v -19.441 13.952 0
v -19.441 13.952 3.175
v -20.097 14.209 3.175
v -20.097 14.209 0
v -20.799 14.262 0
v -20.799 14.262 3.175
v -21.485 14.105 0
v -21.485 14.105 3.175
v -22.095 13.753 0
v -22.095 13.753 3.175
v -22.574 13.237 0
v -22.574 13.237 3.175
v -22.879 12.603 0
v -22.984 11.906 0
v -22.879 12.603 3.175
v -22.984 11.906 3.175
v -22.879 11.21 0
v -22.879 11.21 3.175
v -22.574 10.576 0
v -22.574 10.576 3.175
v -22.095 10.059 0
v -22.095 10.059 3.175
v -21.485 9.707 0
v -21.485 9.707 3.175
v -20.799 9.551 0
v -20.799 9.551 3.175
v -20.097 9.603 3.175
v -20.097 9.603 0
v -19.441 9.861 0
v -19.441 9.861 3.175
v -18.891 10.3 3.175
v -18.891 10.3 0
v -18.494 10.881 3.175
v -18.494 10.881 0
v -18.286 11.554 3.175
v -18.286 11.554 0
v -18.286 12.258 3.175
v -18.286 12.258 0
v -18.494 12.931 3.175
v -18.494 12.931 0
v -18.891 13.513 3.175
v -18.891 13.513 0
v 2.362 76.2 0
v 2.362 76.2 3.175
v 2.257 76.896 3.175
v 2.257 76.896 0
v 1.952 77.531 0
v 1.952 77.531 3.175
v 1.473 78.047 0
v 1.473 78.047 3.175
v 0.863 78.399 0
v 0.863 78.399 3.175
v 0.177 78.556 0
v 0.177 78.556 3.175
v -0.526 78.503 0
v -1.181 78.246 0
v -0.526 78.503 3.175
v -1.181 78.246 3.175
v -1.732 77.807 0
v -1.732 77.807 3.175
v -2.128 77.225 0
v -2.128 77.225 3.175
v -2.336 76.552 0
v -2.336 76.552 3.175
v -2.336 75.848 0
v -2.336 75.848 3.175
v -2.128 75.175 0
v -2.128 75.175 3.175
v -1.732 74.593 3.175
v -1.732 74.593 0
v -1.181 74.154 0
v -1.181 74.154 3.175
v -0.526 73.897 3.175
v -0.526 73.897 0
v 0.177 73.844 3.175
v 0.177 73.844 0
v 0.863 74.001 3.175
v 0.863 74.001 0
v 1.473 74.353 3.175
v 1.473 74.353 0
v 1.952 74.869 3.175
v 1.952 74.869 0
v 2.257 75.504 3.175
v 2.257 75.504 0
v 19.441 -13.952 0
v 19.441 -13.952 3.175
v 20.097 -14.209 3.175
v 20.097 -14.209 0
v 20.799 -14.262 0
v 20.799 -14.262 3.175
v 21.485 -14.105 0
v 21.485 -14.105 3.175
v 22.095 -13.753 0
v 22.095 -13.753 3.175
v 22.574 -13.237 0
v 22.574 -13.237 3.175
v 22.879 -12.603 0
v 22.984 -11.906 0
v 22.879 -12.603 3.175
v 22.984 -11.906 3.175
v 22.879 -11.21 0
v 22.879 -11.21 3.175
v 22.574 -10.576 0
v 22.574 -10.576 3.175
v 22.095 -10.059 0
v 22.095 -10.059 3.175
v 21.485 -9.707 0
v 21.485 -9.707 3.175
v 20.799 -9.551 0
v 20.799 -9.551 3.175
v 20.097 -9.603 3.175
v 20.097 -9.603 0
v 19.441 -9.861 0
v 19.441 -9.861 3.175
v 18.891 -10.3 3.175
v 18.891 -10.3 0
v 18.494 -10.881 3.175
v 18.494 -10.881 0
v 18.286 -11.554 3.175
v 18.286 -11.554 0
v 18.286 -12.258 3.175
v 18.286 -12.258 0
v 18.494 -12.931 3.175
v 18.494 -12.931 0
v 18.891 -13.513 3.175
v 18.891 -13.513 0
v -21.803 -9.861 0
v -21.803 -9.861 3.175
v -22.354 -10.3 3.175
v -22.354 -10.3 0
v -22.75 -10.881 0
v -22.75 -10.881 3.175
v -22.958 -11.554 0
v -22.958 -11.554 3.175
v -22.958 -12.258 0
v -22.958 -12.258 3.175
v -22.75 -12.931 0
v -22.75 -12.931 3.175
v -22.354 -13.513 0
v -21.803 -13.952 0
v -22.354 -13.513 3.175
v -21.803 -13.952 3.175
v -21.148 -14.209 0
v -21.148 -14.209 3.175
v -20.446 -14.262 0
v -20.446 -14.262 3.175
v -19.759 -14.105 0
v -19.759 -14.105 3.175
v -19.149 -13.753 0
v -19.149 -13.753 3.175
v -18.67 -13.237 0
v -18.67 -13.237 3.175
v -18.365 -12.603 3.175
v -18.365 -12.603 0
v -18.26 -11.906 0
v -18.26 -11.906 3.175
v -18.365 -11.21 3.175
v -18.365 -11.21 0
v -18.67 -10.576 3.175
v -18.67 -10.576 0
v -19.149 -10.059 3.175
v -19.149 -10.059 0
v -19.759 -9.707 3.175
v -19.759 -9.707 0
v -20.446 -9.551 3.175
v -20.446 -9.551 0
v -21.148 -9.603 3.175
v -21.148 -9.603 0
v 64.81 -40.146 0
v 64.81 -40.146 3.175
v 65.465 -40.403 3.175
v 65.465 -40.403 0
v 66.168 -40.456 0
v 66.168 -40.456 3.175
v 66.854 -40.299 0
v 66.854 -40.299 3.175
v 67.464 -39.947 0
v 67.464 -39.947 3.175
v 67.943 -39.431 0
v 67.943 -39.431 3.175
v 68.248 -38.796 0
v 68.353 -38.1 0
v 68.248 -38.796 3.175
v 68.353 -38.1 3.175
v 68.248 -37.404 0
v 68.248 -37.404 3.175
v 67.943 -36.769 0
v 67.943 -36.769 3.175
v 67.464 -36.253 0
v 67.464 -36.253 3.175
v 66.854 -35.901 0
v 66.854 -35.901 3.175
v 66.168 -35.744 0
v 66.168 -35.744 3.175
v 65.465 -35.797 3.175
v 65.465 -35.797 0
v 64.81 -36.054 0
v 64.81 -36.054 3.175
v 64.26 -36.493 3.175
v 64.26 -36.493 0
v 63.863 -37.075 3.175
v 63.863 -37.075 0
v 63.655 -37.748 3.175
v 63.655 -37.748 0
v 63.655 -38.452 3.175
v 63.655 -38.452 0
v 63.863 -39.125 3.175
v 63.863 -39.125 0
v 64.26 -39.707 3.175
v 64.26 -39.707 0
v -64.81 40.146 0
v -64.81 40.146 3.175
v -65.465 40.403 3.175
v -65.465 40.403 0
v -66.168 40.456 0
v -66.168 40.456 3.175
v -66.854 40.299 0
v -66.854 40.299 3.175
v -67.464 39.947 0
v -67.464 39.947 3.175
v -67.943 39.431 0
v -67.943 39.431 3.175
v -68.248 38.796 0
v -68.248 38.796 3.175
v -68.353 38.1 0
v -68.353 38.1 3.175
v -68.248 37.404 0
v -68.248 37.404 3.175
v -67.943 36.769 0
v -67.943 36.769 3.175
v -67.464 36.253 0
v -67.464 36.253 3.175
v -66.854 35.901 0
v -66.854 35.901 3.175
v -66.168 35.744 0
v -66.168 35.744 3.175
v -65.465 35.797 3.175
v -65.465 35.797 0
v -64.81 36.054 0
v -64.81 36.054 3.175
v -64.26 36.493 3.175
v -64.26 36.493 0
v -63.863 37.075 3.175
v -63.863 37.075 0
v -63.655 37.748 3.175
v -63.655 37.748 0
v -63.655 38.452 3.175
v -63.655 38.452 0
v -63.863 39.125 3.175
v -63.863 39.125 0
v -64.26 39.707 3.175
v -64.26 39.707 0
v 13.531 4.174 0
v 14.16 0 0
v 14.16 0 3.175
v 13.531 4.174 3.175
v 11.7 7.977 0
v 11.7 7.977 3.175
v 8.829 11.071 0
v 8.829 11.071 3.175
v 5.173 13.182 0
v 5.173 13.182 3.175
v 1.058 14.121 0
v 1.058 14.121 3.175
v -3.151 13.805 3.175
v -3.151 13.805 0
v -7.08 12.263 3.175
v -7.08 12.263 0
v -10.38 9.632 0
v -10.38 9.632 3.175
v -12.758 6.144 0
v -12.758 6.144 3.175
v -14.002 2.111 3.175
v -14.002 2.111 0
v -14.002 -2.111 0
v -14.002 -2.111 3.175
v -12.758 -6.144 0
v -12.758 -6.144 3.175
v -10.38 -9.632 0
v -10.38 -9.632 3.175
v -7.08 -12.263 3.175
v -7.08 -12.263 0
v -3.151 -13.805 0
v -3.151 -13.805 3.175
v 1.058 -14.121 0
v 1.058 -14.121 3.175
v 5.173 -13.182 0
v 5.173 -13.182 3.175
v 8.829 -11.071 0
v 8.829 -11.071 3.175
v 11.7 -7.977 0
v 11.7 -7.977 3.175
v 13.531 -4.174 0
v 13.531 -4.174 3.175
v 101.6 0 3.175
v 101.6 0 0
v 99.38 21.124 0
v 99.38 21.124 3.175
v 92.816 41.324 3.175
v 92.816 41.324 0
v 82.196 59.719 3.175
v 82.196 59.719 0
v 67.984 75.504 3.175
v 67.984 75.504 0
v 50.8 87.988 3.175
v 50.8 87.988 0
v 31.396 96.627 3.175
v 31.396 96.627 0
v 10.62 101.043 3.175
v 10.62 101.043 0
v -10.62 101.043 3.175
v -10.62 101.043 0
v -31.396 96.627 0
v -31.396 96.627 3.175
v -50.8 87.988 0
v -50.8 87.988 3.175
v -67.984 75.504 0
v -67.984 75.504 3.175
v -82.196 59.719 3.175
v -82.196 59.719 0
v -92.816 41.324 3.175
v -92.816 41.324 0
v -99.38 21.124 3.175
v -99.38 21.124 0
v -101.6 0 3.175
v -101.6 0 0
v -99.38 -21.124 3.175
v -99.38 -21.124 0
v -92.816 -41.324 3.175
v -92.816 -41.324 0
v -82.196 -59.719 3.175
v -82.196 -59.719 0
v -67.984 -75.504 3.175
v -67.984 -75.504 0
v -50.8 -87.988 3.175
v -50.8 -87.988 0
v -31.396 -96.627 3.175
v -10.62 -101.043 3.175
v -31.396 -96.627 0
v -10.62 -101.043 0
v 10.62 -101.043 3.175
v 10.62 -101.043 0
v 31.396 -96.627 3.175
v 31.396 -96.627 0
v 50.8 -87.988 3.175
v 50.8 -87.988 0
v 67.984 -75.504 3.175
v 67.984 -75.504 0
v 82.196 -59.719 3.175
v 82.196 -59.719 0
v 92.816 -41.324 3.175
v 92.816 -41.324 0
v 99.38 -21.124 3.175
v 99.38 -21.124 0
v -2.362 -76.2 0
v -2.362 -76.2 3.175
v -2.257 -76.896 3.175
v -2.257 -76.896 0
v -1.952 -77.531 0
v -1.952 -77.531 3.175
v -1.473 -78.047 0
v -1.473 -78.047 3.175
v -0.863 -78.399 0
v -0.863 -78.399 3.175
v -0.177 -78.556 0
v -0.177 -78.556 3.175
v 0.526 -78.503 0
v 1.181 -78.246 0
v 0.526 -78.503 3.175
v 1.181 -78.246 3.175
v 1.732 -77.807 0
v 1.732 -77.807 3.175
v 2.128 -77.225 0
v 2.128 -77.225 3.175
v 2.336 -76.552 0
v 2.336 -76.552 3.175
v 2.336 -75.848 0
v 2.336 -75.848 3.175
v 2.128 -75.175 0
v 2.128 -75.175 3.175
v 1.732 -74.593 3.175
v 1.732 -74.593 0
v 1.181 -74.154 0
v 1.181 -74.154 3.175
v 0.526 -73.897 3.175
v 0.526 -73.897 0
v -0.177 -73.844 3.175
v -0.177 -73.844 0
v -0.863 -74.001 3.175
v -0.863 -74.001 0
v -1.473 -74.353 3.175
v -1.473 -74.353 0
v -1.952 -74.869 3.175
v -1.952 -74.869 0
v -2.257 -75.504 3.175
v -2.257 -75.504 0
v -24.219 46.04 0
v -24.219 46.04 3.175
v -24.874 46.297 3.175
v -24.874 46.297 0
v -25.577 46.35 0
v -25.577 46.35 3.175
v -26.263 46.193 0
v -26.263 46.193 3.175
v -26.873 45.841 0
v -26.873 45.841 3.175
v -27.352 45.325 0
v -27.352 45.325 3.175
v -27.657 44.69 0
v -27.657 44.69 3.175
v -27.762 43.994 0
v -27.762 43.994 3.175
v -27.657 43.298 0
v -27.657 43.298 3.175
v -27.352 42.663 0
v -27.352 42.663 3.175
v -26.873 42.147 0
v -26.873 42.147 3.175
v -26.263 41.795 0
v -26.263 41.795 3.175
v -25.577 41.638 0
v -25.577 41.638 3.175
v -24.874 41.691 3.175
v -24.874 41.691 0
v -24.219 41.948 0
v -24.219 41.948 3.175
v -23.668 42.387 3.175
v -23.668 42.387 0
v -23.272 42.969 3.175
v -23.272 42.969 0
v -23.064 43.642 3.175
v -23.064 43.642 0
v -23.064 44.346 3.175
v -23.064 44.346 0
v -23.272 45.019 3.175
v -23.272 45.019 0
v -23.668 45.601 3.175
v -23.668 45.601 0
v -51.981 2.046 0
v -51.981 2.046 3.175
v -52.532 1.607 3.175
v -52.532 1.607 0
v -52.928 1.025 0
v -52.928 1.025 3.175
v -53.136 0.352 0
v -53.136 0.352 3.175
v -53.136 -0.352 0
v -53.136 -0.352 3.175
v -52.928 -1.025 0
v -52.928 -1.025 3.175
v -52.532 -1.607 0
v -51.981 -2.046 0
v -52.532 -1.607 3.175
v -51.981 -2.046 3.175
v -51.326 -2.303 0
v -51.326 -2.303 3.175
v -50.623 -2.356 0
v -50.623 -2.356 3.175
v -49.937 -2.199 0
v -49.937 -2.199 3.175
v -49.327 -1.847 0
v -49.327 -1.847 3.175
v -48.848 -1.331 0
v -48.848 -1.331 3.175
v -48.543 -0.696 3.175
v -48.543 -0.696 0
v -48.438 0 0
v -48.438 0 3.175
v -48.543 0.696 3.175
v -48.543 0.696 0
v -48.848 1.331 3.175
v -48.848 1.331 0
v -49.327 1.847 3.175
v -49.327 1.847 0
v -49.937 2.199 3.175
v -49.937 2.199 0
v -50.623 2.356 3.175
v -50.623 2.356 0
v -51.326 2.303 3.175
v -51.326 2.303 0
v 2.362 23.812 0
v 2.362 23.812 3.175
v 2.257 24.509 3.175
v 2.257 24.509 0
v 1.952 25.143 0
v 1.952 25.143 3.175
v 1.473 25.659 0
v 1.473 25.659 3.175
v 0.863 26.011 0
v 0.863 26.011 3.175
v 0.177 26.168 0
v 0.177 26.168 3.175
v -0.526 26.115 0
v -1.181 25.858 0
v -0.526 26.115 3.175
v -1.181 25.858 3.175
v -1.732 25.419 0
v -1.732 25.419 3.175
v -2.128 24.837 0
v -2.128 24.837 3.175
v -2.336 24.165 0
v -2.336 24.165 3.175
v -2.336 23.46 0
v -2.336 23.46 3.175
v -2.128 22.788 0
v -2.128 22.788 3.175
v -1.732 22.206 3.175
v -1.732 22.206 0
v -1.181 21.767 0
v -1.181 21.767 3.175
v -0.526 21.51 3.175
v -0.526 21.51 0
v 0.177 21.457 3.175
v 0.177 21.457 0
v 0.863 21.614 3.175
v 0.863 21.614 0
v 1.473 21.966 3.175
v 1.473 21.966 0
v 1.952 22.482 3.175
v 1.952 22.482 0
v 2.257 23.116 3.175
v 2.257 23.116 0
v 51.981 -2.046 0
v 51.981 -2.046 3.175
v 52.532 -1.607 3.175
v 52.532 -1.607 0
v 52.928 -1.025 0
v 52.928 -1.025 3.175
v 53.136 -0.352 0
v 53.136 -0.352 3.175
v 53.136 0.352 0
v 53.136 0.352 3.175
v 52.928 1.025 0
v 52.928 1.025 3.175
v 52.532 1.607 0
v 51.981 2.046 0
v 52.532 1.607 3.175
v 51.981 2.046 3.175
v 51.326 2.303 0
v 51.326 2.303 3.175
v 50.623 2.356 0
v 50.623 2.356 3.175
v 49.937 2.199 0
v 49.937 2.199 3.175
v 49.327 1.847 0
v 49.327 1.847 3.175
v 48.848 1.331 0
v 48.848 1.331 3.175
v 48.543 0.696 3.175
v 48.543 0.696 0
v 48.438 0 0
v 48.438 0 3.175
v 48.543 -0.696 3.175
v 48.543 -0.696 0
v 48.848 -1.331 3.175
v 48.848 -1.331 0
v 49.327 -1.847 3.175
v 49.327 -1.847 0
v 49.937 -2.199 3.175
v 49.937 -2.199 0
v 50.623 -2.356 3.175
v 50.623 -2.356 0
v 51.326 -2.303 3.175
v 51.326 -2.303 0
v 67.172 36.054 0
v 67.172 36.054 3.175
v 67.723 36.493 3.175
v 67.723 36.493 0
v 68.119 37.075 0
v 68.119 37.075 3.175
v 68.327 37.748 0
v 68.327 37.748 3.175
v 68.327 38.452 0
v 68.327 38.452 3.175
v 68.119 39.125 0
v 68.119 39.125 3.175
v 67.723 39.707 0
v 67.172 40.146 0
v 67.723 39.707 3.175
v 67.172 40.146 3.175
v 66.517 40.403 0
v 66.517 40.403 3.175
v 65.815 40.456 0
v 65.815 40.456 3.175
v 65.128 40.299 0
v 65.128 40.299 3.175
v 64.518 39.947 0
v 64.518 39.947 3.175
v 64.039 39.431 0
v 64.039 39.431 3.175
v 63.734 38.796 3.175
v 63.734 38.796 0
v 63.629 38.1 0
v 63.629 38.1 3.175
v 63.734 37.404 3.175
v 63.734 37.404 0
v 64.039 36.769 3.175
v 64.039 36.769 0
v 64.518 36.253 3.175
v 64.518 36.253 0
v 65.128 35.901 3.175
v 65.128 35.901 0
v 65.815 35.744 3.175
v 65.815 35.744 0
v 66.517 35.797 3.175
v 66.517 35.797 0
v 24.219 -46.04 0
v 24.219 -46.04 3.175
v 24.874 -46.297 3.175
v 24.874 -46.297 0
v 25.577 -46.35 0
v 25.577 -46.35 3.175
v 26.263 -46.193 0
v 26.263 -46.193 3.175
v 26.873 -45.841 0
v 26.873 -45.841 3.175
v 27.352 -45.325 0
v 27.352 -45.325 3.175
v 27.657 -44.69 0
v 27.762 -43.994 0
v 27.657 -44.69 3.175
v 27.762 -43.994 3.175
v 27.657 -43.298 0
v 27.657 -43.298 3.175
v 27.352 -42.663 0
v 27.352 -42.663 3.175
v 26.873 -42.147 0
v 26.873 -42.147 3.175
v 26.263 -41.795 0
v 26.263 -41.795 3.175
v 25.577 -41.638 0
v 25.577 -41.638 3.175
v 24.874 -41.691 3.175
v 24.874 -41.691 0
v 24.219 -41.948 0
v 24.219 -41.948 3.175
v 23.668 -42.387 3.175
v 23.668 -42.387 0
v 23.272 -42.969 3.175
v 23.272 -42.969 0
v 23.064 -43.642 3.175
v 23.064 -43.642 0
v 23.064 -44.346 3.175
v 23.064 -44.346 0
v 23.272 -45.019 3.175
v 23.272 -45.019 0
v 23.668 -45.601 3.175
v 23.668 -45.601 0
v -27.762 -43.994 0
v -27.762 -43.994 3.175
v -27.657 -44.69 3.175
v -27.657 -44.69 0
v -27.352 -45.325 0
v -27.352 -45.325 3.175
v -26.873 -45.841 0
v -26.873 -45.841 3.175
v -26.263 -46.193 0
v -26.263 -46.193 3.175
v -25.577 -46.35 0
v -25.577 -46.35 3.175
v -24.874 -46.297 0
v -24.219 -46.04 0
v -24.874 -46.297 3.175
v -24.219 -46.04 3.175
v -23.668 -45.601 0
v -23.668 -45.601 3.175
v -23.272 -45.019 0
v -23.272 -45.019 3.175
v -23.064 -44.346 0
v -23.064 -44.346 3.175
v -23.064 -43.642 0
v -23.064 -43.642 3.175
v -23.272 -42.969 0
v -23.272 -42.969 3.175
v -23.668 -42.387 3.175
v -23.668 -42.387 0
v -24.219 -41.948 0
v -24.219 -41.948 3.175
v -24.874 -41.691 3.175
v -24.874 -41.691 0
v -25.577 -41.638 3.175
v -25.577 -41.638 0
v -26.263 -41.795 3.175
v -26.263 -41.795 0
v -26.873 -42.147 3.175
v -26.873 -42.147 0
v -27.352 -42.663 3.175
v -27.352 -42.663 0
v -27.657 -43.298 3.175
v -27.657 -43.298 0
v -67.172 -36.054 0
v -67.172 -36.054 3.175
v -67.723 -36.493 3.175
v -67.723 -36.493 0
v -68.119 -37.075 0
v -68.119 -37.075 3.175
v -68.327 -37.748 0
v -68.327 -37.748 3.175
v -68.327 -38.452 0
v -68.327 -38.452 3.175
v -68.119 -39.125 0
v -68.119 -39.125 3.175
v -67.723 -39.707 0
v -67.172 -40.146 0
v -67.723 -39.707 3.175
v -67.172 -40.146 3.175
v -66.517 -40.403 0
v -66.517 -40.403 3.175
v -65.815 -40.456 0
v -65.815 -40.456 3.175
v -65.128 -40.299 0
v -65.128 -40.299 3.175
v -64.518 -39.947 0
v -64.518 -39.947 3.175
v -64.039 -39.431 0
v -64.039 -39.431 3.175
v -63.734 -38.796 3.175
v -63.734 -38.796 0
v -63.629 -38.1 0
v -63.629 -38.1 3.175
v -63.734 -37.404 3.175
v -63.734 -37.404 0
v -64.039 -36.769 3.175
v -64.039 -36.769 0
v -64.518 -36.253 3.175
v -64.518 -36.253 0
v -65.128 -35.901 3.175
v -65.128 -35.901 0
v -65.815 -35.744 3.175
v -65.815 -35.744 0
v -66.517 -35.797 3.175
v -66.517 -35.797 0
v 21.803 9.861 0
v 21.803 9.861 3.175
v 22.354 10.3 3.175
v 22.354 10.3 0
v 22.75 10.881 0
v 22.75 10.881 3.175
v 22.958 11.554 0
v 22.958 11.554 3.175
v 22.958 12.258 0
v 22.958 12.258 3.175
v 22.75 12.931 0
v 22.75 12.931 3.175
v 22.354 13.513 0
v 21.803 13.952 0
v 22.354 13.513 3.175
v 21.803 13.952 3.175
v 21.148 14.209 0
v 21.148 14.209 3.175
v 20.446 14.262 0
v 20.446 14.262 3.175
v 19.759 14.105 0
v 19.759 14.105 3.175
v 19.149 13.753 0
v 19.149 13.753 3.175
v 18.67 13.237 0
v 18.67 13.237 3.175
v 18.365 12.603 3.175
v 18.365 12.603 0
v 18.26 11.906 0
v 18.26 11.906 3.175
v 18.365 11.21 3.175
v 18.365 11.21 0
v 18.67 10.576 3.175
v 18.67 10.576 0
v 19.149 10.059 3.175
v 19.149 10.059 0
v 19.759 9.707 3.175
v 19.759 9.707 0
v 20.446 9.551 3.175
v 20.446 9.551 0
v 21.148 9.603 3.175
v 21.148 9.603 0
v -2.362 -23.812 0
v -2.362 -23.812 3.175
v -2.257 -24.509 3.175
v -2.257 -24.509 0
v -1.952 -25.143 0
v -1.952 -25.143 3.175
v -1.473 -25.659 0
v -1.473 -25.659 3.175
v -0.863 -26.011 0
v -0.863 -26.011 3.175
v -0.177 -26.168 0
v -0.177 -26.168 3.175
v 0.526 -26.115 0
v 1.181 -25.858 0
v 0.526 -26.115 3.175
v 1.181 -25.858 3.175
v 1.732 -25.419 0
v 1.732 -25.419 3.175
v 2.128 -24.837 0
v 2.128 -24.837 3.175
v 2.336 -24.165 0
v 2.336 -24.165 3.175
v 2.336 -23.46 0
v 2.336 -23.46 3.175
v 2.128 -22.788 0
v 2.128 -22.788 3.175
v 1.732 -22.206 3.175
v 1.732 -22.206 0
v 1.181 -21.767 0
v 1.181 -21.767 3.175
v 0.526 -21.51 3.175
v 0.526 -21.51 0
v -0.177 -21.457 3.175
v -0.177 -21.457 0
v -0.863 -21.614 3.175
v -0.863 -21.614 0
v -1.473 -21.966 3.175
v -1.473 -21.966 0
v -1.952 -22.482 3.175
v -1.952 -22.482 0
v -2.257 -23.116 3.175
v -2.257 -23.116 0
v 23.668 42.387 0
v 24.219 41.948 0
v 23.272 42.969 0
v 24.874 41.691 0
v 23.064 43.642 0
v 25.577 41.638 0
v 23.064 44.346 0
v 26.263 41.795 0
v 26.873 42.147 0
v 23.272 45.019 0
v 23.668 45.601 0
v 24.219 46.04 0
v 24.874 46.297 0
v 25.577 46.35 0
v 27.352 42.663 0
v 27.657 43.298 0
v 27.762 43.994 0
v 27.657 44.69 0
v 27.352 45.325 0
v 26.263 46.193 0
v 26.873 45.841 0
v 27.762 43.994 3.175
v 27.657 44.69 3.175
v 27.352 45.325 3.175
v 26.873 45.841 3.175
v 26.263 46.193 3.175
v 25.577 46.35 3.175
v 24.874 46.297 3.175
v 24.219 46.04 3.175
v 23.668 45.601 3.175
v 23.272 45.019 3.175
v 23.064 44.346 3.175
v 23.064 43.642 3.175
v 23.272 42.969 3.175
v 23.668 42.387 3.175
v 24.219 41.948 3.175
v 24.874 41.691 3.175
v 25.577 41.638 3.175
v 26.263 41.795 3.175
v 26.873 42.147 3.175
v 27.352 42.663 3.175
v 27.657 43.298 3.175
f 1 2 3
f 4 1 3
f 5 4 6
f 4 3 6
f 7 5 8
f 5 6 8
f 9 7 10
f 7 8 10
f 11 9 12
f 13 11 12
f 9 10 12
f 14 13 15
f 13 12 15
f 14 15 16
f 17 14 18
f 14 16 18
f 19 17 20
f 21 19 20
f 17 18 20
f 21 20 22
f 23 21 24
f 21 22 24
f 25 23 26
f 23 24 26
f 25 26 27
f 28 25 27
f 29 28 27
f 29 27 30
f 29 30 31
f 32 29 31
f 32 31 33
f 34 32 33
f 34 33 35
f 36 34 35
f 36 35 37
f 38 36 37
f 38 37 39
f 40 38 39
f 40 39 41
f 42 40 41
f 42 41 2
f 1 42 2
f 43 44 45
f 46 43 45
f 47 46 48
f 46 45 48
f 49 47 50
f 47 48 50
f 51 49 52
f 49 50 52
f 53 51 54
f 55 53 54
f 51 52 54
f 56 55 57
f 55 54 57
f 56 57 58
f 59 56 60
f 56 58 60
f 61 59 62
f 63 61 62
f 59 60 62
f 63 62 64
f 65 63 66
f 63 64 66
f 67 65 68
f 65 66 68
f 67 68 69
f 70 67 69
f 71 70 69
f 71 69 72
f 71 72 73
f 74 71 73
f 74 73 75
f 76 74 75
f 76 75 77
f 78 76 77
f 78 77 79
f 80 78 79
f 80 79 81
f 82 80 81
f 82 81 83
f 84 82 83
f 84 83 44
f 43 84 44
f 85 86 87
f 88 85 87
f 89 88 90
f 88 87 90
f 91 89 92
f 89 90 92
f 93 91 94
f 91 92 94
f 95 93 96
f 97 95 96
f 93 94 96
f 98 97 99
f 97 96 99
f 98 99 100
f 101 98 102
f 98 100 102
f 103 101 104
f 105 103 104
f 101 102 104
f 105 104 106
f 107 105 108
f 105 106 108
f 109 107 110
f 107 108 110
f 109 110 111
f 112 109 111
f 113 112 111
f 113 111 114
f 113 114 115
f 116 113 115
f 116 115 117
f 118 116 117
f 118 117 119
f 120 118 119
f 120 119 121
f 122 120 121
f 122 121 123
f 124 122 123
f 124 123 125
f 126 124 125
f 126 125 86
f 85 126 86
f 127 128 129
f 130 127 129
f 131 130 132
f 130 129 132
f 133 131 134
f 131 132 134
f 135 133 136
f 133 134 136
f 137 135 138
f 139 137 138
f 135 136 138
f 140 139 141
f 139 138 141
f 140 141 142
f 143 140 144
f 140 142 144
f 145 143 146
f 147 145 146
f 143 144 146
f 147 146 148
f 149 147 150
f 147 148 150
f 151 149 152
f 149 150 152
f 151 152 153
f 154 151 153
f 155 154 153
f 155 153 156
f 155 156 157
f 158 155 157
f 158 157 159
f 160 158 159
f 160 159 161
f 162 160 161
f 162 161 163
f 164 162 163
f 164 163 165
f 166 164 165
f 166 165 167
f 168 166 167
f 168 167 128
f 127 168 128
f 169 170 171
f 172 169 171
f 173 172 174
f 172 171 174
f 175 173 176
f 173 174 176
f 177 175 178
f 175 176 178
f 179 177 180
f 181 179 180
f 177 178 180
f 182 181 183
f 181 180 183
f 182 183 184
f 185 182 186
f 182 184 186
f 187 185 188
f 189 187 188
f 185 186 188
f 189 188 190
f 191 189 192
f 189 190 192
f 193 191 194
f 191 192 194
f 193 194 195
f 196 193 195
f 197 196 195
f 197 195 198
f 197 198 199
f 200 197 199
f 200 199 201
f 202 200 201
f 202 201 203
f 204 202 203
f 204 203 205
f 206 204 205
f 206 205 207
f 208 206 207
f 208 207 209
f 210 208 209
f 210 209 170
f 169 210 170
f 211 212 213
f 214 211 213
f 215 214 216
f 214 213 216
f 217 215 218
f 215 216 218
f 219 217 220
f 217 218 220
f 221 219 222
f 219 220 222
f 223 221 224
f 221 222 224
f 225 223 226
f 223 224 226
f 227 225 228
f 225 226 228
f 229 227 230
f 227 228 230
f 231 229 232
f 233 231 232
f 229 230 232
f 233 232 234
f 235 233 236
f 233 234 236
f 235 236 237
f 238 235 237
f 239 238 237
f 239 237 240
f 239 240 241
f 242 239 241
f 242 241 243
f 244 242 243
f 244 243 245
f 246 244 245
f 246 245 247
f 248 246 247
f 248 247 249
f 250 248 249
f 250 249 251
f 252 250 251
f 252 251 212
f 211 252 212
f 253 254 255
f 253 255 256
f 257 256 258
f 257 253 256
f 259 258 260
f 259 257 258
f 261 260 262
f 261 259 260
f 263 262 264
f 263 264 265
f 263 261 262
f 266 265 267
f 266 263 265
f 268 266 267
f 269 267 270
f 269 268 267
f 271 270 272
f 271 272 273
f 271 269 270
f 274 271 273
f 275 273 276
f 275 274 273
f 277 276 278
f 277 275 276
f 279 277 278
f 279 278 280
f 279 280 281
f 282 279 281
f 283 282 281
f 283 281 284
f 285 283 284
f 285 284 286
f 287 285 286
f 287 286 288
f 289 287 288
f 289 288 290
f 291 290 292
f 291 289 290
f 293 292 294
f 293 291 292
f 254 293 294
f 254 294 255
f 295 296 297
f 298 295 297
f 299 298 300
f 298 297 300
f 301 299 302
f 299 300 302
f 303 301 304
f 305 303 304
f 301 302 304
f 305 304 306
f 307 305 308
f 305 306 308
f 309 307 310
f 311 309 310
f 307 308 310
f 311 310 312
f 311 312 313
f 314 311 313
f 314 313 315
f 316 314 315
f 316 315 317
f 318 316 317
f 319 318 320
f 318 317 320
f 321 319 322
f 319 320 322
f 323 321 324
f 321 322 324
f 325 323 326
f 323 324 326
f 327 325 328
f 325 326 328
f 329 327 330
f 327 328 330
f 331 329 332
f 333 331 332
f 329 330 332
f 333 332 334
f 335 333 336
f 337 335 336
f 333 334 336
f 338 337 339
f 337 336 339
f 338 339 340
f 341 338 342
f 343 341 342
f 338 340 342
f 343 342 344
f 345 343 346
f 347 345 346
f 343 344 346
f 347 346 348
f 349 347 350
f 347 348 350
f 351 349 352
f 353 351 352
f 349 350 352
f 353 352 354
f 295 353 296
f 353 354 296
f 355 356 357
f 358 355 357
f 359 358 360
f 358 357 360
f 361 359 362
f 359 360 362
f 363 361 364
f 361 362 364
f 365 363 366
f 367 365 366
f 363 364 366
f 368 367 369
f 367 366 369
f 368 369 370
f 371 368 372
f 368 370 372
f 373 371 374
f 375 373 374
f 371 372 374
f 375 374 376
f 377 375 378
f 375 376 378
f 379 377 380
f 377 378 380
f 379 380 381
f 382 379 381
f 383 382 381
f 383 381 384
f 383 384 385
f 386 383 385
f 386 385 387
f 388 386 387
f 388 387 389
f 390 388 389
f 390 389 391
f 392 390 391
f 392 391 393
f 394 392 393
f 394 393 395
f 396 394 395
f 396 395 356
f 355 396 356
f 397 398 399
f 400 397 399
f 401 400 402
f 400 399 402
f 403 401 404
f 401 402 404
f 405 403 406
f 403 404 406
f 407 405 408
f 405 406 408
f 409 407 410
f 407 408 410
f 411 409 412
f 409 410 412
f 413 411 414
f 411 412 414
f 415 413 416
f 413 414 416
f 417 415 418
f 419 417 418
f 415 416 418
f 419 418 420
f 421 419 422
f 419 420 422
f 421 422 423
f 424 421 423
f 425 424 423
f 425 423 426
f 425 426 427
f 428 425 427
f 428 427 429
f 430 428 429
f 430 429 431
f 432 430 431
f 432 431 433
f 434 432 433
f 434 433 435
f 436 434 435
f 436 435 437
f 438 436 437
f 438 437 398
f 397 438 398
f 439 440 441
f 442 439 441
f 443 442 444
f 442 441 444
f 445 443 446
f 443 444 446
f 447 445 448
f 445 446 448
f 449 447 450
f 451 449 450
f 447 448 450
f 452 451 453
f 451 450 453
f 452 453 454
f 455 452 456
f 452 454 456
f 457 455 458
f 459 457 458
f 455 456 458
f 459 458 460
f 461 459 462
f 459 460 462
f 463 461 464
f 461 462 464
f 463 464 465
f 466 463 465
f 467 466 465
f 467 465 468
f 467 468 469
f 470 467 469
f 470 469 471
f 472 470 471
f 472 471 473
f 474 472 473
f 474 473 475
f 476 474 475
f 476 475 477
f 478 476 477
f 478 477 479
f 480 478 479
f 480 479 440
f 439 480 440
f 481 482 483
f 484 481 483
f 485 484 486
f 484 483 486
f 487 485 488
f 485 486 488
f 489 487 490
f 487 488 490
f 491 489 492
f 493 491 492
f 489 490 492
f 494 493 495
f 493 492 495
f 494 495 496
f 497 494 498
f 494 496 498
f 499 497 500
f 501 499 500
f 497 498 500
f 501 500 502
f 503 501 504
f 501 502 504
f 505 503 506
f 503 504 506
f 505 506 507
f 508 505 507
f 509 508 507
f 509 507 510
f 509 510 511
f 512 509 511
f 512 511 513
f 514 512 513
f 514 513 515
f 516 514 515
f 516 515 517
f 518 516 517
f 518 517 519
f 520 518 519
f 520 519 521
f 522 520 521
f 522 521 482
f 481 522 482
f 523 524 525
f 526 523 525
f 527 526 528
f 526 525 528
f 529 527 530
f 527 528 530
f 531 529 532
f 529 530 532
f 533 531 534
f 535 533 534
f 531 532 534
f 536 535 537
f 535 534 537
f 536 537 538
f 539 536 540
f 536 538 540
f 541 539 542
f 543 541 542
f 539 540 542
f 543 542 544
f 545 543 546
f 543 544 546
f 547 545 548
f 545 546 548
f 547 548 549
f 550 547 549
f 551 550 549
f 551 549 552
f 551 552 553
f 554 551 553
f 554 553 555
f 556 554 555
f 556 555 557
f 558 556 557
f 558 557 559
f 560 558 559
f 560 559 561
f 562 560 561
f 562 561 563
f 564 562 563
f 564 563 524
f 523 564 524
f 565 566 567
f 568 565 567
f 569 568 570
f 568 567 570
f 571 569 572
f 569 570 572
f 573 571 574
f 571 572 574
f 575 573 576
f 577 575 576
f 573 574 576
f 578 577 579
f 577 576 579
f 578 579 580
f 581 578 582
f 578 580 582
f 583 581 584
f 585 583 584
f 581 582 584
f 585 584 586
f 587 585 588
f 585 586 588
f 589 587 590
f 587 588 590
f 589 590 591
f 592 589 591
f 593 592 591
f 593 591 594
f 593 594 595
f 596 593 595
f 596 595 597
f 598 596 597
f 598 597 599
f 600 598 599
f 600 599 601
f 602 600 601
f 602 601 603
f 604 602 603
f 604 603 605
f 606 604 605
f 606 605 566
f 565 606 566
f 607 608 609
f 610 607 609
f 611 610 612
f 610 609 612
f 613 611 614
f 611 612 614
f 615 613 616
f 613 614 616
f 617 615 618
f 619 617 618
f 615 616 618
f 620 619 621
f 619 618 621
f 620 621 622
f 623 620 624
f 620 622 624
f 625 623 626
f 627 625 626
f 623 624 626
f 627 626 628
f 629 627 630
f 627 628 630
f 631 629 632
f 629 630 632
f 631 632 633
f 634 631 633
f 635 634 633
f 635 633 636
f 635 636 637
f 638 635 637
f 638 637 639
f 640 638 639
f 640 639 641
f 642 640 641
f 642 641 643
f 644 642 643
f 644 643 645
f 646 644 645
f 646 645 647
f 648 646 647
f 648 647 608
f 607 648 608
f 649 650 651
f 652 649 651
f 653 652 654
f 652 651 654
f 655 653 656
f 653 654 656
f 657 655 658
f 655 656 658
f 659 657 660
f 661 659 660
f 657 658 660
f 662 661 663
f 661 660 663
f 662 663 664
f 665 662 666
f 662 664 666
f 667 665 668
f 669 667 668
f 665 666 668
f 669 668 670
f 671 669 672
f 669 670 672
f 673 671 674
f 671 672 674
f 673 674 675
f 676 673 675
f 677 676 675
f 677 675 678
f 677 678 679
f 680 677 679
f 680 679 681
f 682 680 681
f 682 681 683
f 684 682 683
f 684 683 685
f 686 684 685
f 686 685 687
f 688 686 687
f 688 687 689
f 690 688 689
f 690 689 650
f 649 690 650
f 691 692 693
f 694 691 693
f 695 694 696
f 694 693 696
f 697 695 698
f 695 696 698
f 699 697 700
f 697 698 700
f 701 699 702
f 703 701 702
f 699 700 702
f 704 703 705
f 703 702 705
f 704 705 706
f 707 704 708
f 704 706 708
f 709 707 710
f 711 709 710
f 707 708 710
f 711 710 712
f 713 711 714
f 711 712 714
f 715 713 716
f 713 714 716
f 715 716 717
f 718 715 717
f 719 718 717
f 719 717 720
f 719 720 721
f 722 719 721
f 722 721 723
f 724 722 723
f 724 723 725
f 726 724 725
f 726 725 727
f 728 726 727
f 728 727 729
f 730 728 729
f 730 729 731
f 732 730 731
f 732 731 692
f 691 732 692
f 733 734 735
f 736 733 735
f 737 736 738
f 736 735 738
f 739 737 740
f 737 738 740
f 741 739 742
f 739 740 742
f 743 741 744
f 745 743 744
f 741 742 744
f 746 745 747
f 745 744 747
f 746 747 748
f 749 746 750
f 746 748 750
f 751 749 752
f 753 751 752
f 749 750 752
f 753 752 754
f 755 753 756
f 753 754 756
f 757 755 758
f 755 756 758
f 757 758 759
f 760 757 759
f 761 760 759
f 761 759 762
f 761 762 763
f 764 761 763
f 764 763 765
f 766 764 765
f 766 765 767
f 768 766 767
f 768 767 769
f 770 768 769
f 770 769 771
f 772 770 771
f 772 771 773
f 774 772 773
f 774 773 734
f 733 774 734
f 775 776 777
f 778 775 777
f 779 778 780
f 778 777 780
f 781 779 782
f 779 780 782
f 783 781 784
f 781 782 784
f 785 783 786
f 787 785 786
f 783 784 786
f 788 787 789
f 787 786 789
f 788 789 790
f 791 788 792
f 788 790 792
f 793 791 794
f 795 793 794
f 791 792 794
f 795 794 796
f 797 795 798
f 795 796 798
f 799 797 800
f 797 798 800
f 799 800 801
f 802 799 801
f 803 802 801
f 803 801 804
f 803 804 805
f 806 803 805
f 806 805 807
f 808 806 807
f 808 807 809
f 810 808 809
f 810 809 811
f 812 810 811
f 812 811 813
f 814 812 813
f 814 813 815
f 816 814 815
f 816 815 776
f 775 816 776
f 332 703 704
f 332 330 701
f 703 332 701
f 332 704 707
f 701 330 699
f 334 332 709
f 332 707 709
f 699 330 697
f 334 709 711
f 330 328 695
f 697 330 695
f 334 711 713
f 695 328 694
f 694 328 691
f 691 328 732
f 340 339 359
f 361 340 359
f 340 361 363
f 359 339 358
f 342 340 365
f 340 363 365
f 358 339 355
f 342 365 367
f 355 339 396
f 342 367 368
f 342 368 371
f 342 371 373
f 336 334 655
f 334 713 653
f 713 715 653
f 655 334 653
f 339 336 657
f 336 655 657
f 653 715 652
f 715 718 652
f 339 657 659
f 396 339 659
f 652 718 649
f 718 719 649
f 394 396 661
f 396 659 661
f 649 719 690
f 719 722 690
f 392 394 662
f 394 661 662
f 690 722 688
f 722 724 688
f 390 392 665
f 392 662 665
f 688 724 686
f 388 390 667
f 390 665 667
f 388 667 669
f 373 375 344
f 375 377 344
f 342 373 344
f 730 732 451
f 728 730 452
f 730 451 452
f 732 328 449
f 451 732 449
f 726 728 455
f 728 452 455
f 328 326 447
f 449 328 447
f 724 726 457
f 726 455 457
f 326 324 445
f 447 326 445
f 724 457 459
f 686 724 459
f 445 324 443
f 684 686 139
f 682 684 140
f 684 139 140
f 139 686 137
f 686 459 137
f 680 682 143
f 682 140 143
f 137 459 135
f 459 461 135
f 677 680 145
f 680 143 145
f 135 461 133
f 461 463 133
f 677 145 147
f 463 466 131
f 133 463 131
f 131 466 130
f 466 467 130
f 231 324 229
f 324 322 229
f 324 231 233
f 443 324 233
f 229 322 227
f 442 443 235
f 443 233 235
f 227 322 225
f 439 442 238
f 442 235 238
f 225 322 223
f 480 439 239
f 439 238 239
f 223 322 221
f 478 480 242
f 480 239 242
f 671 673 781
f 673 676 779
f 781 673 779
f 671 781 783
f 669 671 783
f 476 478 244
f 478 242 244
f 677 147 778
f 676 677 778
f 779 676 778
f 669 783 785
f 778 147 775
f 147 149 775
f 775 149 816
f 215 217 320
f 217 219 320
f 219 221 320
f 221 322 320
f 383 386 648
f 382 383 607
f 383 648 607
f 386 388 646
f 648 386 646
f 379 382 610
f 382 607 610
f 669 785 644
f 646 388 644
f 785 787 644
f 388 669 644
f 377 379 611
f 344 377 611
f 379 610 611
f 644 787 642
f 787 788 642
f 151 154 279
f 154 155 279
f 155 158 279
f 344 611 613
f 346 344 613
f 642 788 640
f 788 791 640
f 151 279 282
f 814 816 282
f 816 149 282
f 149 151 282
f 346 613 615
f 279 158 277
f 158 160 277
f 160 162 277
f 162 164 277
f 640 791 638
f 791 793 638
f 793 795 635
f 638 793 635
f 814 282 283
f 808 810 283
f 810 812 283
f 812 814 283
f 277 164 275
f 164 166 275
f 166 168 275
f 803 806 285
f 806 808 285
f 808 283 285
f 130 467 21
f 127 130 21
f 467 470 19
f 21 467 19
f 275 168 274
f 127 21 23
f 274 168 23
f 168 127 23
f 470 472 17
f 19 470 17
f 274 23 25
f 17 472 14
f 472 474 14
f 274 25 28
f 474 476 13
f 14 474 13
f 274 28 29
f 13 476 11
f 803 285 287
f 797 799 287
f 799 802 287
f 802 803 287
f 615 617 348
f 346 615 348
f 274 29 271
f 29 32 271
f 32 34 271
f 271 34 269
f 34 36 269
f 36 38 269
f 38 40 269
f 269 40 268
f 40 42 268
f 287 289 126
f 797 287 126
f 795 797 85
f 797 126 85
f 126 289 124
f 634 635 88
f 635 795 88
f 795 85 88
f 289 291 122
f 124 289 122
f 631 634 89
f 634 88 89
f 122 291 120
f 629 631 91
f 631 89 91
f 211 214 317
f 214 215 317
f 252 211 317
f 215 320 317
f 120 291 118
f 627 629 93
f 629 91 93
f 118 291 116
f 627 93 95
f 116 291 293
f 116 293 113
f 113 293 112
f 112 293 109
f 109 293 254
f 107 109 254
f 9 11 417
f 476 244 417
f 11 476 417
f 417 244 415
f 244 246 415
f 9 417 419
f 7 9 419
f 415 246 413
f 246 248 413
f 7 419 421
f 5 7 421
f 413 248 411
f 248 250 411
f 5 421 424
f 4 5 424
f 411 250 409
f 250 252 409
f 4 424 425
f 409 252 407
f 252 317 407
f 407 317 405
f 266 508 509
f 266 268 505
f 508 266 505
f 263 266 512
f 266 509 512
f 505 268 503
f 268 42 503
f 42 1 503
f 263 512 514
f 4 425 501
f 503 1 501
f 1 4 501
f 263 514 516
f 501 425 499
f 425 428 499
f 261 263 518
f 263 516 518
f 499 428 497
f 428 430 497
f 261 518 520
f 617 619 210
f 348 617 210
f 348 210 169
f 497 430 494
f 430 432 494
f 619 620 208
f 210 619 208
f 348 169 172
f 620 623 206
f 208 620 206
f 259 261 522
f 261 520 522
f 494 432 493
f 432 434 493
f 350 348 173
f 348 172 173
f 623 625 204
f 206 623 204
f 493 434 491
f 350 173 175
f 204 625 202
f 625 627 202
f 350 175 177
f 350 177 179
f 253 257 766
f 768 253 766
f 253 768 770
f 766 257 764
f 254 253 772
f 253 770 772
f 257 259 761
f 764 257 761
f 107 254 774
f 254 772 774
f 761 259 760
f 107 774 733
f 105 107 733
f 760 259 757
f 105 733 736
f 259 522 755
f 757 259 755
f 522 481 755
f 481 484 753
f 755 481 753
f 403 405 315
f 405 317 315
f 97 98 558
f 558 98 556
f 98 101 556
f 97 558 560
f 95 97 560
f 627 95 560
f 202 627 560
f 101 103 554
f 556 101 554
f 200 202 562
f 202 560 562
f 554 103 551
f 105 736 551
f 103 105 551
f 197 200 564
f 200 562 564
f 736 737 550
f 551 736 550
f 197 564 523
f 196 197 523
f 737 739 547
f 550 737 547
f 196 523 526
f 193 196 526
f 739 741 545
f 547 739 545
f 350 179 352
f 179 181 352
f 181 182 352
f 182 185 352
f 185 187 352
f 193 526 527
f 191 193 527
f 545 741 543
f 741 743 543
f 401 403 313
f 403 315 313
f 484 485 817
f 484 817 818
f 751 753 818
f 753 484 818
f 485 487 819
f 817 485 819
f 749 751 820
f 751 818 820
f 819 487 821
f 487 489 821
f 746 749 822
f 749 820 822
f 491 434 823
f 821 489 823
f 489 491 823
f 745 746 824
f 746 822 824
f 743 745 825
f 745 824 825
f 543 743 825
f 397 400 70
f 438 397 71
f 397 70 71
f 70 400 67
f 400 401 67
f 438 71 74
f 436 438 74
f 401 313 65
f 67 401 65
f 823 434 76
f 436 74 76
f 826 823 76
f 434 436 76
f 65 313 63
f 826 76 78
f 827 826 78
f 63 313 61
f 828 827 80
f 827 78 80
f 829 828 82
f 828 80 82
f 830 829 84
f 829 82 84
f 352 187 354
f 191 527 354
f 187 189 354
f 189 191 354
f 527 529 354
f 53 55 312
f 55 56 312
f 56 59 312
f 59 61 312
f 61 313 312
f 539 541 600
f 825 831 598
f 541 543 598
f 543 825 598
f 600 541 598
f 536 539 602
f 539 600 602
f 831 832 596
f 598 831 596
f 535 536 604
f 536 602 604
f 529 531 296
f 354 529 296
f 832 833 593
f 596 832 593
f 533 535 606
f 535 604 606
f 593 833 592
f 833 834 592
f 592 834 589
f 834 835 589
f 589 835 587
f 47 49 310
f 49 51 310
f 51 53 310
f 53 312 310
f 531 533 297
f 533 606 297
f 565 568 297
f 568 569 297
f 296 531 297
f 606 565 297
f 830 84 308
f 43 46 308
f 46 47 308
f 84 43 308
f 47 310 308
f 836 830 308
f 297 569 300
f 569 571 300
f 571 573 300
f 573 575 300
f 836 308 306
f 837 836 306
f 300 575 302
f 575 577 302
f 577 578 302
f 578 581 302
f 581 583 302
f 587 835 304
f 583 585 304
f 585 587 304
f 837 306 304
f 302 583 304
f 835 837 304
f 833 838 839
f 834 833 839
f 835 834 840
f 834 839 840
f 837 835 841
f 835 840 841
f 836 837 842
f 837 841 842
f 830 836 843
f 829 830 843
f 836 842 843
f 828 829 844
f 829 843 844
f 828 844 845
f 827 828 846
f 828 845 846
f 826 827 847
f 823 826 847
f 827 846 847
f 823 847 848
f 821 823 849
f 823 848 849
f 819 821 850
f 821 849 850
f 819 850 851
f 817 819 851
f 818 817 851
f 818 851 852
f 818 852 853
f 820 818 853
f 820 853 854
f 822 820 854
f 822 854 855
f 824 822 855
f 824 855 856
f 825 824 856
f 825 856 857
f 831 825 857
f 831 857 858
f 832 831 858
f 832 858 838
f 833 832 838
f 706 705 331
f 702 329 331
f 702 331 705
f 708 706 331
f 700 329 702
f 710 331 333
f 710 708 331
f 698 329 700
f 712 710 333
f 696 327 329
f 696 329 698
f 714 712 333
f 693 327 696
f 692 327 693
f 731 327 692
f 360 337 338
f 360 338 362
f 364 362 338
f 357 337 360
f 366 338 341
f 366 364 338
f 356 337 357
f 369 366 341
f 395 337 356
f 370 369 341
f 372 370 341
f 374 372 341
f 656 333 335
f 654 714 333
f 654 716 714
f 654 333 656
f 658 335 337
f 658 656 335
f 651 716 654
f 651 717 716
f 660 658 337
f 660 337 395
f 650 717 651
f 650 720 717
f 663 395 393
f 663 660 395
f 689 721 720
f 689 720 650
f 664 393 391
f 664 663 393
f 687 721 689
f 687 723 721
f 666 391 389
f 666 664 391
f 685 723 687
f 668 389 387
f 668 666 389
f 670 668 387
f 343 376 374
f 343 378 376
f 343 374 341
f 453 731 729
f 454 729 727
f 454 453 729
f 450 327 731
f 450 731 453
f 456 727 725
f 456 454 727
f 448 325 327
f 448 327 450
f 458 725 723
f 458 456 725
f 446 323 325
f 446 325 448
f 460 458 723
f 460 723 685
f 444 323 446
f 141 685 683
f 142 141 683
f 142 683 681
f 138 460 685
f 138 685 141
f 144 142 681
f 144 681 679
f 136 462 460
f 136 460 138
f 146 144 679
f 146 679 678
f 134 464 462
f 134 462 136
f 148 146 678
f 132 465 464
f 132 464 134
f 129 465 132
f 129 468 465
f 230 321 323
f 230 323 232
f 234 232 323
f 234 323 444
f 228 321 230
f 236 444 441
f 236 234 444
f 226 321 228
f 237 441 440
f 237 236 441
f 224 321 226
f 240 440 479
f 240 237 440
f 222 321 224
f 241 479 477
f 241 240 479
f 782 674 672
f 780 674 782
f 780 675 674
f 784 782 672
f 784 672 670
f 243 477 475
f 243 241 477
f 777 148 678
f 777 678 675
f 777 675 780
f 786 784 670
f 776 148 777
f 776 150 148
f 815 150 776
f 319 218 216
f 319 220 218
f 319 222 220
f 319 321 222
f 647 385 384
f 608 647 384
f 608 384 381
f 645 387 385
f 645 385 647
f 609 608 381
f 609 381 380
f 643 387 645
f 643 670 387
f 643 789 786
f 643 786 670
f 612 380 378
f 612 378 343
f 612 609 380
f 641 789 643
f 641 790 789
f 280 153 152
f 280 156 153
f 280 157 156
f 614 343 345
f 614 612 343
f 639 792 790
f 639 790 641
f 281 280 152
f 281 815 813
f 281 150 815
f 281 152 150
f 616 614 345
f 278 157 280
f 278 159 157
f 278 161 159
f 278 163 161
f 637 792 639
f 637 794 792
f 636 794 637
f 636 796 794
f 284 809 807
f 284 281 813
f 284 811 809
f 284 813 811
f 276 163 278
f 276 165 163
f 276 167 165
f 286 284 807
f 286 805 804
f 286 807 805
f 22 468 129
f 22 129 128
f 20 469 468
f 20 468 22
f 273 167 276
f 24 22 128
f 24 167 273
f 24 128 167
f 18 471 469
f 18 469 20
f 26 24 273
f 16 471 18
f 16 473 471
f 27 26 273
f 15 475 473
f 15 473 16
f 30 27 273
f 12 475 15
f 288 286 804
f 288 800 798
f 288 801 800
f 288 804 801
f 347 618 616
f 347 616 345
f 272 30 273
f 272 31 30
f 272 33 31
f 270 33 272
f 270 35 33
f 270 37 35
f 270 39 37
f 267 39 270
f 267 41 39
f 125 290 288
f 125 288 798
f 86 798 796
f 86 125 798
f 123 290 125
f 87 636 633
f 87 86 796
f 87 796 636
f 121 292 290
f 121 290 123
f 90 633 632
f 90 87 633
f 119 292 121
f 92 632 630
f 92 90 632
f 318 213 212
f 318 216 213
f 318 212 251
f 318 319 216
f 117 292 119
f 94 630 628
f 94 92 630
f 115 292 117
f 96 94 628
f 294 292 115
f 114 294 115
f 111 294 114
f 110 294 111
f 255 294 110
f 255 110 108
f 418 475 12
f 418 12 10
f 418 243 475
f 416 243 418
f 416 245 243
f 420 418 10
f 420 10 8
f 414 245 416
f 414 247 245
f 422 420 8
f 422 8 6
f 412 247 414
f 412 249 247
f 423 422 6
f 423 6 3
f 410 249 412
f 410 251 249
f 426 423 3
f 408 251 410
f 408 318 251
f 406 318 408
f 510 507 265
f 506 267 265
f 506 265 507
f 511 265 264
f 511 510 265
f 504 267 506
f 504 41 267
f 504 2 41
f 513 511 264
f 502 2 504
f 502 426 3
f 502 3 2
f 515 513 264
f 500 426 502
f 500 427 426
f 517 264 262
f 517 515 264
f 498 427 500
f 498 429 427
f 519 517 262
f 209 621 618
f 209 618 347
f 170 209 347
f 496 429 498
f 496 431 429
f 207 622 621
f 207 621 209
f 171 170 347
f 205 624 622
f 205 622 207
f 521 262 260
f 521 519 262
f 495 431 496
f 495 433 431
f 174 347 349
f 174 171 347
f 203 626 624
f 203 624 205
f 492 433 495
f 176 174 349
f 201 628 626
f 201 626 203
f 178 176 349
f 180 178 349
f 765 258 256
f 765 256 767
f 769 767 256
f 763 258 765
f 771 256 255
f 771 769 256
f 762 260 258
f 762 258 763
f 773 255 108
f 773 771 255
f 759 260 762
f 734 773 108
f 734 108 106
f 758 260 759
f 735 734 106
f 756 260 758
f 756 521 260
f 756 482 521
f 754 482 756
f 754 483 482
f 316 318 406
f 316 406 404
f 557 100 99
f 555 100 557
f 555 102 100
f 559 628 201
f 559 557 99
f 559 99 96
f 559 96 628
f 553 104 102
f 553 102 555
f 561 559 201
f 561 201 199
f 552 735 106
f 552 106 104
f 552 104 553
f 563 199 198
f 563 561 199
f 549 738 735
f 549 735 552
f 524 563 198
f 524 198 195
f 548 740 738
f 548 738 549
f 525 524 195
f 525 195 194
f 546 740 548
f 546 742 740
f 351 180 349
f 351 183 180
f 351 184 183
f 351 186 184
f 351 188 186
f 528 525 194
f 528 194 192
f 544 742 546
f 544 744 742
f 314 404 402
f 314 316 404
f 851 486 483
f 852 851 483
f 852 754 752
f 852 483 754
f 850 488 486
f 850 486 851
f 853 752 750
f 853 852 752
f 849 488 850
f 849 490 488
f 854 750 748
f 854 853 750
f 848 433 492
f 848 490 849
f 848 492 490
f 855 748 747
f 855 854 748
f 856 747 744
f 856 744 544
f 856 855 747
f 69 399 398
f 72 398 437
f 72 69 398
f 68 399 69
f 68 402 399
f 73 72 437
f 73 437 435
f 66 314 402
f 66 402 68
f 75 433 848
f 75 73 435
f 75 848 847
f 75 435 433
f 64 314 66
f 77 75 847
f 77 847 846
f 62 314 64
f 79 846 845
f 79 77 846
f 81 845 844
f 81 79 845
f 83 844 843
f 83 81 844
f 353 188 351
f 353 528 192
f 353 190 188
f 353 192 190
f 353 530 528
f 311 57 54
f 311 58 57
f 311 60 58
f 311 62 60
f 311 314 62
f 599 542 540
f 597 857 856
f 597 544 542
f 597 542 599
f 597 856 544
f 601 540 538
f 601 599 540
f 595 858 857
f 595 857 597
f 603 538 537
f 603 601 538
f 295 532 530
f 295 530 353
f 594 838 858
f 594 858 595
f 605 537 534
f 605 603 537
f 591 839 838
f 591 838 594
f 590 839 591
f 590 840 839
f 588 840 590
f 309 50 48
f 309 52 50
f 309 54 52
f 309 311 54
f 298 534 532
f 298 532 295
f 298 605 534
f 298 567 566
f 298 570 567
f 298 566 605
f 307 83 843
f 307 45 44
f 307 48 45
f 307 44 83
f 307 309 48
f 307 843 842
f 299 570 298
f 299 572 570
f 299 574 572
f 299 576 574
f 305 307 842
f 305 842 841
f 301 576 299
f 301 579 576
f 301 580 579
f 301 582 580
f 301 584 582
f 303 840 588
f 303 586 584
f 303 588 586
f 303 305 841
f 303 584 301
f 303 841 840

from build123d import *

# Parameters (mm, degrees)
F0_R            = 101.6
F0_R_2          = 14.1605
F1_DEPTH        = 3.175
F2_R            = 2.3622
F3_DEPTH        = 3.176
F3_COPIES_COUNT = 6


# Not quite as in the source:
# - a pattern or mirror of a feature is missing from the dataset's text; its kind, count and spacing are read off the source's solid


with BuildPart() as f1:
    # F0 (on Top) → F1 (new body)
    with BuildSketch(Plane.XY):
        Circle(F0_R)
        Circle(F0_R_2, mode=Mode.SUBTRACT)
    extrude(amount=F1_DEPTH)

    # F2 (on face) → F3 (cut, through all)
    with BuildSketch(Plane.XY.offset(3.175)):
        with Locations((0, 23.8125)):
            Circle(F2_R)
        with Locations((0, 76.2)):
            Circle(F2_R)
        with Locations((25.4, 43.9940905122)):
            Circle(F2_R)
    f3 = extrude(amount=-F3_DEPTH, mode=Mode.SUBTRACT)

    # F3_copies: F3 ×6 about axis
    f3_copies_axis = Axis((0, 0, 0), (0, 0, 1))
    for i in range(1, F3_COPIES_COUNT):
        add(f3.rotate(f3_copies_axis, i * 360 / F3_COPIES_COUNT), mode=Mode.SUBTRACT)


solid = f1.part
